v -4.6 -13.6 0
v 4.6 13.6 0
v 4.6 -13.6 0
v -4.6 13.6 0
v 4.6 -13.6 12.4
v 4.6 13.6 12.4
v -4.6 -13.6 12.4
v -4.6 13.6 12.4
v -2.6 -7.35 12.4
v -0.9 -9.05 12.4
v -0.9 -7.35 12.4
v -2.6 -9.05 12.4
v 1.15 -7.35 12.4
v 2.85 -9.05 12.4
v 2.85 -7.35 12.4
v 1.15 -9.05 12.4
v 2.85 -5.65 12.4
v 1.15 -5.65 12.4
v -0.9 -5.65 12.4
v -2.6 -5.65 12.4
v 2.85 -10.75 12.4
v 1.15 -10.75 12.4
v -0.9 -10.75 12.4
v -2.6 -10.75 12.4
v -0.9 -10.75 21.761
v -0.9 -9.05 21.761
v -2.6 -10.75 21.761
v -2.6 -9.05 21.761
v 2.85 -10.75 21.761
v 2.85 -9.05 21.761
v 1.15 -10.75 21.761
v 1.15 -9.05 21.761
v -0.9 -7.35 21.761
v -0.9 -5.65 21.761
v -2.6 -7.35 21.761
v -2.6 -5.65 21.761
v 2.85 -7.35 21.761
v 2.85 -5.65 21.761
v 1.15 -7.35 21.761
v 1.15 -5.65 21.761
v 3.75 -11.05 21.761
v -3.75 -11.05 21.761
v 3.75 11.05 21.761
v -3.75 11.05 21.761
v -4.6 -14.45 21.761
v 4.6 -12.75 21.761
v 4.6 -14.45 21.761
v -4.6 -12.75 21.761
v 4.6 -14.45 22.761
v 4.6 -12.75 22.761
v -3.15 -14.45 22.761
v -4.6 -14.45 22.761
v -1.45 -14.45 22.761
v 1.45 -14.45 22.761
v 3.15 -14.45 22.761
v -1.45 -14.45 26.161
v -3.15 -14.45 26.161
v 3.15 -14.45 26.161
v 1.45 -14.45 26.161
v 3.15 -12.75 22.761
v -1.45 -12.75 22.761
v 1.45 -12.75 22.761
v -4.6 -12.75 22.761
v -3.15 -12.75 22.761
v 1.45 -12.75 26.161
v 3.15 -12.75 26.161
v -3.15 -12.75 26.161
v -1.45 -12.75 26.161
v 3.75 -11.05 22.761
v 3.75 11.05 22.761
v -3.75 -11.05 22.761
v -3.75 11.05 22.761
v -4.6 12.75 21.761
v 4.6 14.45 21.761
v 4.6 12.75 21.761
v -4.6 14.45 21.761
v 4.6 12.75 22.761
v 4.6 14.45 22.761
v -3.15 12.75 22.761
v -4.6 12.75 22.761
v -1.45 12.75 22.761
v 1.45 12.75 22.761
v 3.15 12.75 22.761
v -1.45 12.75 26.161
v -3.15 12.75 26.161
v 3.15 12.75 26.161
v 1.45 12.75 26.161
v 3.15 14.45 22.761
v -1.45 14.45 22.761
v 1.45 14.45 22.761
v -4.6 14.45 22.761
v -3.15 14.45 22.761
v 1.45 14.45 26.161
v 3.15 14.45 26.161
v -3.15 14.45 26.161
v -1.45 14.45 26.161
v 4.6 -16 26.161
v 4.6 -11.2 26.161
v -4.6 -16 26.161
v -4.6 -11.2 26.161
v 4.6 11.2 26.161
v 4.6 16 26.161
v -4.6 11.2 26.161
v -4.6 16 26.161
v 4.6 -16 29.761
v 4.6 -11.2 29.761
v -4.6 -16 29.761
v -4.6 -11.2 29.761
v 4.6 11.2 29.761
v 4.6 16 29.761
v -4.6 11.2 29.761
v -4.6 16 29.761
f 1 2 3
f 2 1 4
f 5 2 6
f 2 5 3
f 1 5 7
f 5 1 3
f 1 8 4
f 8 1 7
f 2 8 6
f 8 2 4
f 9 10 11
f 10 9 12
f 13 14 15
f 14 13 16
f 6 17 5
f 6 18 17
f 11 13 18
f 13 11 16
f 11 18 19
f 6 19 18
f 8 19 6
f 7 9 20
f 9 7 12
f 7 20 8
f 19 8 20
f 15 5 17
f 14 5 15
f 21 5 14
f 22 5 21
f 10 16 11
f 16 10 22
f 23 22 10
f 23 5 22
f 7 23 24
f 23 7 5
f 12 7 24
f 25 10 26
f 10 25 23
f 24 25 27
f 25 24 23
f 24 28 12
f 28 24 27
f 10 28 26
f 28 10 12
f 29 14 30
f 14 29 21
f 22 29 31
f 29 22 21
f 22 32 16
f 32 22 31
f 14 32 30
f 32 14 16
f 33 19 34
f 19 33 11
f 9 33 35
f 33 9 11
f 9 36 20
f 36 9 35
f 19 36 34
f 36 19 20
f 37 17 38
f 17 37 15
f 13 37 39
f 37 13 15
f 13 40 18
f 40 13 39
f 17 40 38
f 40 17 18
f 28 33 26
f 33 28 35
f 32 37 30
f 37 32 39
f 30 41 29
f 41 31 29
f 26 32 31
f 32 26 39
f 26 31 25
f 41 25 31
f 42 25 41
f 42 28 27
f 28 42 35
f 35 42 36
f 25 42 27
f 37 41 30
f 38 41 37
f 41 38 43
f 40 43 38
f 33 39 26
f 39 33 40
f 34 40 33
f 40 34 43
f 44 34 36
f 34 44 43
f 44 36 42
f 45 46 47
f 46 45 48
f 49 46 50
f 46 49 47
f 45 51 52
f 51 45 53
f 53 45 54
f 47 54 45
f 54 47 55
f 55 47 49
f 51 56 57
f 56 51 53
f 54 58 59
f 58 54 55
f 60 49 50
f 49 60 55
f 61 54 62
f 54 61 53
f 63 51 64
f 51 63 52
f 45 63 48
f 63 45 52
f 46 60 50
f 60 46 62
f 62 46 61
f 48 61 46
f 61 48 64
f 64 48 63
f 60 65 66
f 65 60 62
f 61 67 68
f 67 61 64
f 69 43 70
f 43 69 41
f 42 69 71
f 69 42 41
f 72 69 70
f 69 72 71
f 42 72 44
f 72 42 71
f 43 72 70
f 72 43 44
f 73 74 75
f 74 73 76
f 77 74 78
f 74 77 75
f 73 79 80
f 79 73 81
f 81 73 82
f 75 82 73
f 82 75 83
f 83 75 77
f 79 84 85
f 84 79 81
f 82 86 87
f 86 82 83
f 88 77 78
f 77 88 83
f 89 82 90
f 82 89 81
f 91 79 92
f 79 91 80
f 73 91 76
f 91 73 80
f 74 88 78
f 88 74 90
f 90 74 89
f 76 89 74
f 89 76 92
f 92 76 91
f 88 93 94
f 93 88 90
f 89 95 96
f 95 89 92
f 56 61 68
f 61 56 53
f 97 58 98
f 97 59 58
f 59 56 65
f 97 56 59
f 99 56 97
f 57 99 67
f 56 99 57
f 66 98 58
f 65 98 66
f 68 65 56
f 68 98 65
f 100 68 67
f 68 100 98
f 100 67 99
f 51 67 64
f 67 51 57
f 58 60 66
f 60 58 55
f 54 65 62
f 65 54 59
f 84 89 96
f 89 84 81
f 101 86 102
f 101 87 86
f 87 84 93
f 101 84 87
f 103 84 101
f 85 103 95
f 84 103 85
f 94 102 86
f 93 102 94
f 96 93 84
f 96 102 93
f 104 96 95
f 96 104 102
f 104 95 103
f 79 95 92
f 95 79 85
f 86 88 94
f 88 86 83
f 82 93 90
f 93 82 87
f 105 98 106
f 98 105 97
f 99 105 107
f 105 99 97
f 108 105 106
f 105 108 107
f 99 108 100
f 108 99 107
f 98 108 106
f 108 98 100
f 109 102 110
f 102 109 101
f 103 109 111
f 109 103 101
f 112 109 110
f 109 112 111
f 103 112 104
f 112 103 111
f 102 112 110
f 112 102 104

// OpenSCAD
// Generated by SolidPython 0.4.2 on 2020-09-29 23:20:35
//!OpenSCAD

scale(v = 0.0100000000) {
	translate(v = [-460, -1360, 0]) {
		union() {
			color(c = [0.4000000000, 0.4000000000, 0.4000000000]) {
				translate(v = [0, 0, 0]) {
					linear_extrude(height = 1000.0000000000) {
						polygon(paths = [[0, 1, 2, 3]], points = [[0, 0], [0, 2720], [920, 2720], [920, 0]]);
					}
				}
			}
			color(c = [0.2000000000, 0.6000000000, 0.2000000000]) {
				translate(v = [0, 0, 1000.0000000000]) {
					linear_extrude(height = 120.0000000000) {
						polygon(paths = [[0, 1, 2, 3]], points = [[0, 1305], [0, 2720], [920, 2720], [920, 1305]]);
					}
				}
			}
			color(c = [0.4000000000, 0.4000000000, 0.4000000000]) {
				translate(v = [0, 0, 1000.0000000000]) {
					linear_extrude(height = 120.0000000000) {
						polygon(paths = [[0, 1, 2, 3]], points = [[0, 0], [0, 1305], [920, 1305], [920, 0]]);
					}
				}
			}
			color(c = [0.9000000000, 0.6000000000, 0.9000000000]) {
				translate(v = [0, 0, 1120.0000000000]) {
					linear_extrude(height = 120.0000000000) {
						polygon(paths = [[0, 1, 2, 3]], points = [[155, 195], [155, 885], [785, 885], [785, 195]]);
					}
				}
			}
			color(c = [0.2000000000, 0.6000000000, 0.2000000000]) {
				translate(v = [0, 0, 1120.0000000000]) {
					linear_extrude(height = 120.0000000000) {
						polygon(paths = [[0, 1, 2, 3]], points = [[0, 1305], [0, 2720], [920, 2720], [920, 1305]]);
					}
				}
			}
			color(c = [0.4000000000, 0.4000000000, 0.4000000000]) {
				translate(v = [0, 0, 1120.0000000000]) {
					linear_extrude(height = 120.0000000000) {
						difference() {
							polygon(paths = [[0, 1, 2, 3]], points = [[0, 0], [0, 1305], [920, 1305], [920, 0]]);
							polygon(paths = [[0, 1, 2, 3]], points = [[155, 195], [785, 195], [785, 885], [155, 885]]);
						}
					}
				}
			}
			color(c = [0.1000000000, 0.1000000000, 0.1000000000]) {
				translate(v = [0, 0, 1240.0000000000]) {
					linear_extrude(height = 70.0000000000) {
						polygon(paths = [[0, 1, 2, 3]], points = [[200, 285], [200, 455], [370, 455], [370, 285]]);
					}
				}
			}
			color(c = [0.1000000000, 0.1000000000, 0.1000000000]) {
				translate(v = [0, 0, 1240.0000000000]) {
					linear_extrude(height = 70.0000000000) {
						polygon(paths = [[0, 1, 2, 3]], points = [[575, 285], [575, 455], [745, 455], [745, 285]]);
					}
				}
			}
			color(c = [0.1000000000, 0.1000000000, 0.1000000000]) {
				translate(v = [0, 0, 1240.0000000000]) {
					linear_extrude(height = 70.0000000000) {
						polygon(paths = [[0, 1, 2, 3]], points = [[200, 625], [200, 795], [370, 795], [370, 625]]);
					}
				}
			}
			color(c = [0.1000000000, 0.1000000000, 0.1000000000]) {
				translate(v = [0, 0, 1240.0000000000]) {
					linear_extrude(height = 70.0000000000) {
						polygon(paths = [[0, 1, 2, 3]], points = [[575, 625], [575, 795], [745, 795], [745, 625]]);
					}
				}
			}
			color(c = [0.1000000000, 0.1000000000, 0.1000000000]) {
				translate(v = [0, 0, 1310.0000000000]) {
					linear_extrude(height = 180.0000000000) {
						polygon(paths = [[0, 1, 2, 3]], points = [[200, 285], [200, 455], [370, 455], [370, 285]]);
					}
				}
			}
			color(c = [0.1000000000, 0.1000000000, 0.1000000000]) {
				translate(v = [0, 0, 1310.0000000000]) {
					linear_extrude(height = 180.0000000000) {
						polygon(paths = [[0, 1, 2, 3]], points = [[575, 285], [575, 455], [745, 455], [745, 285]]);
					}
				}
			}
			color(c = [0.1000000000, 0.1000000000, 0.1000000000]) {
				translate(v = [0, 0, 1310.0000000000]) {
					linear_extrude(height = 180.0000000000) {
						polygon(paths = [[0, 1, 2, 3]], points = [[200, 625], [200, 795], [370, 795], [370, 625]]);
					}
				}
			}
			color(c = [0.1000000000, 0.1000000000, 0.1000000000]) {
				translate(v = [0, 0, 1310.0000000000]) {
					linear_extrude(height = 180.0000000000) {
						polygon(paths = [[0, 1, 2, 3]], points = [[575, 625], [575, 795], [745, 795], [745, 625]]);
					}
				}
			}
			color(c = [0.1000000000, 0.1000000000, 0.1000000000]) {
				translate(v = [0, 0, 1490.0000000000]) {
					linear_extrude(height = 686.1000000000) {
						polygon(paths = [[0, 1, 2, 3]], points = [[200, 285], [200, 455], [370, 455], [370, 285]]);
					}
				}
			}
			color(c = [0.1000000000, 0.1000000000, 0.1000000000]) {
				translate(v = [0, 0, 1490.0000000000]) {
					linear_extrude(height = 686.1000000000) {
						polygon(paths = [[0, 1, 2, 3]], points = [[575, 285], [575, 455], [745, 455], [745, 285]]);
					}
				}
			}
			color(c = [0.1000000000, 0.1000000000, 0.1000000000]) {
				translate(v = [0, 0, 1490.0000000000]) {
					linear_extrude(height = 686.1000000000) {
						polygon(paths = [[0, 1, 2, 3]], points = [[200, 625], [200, 795], [370, 795], [370, 625]]);
					}
				}
			}
			color(c = [0.1000000000, 0.1000000000, 0.1000000000]) {
				translate(v = [0, 0, 1490.0000000000]) {
					linear_extrude(height = 686.1000000000) {
						polygon(paths = [[0, 1, 2, 3]], points = [[575, 625], [575, 795], [745, 795], [745, 625]]);
					}
				}
			}
			color(c = [0.9000000000, 0.6000000000, 0.6000000000]) {
				translate(v = [0, 0, 2176.1000000000]) {
					linear_extrude(height = 100.0000000000) {
						polygon(paths = [[0, 1, 2, 3]], points = [[0, -85], [0, 85], [920, 85], [920, -85]]);
					}
				}
			}
			color(c = [0.9000000000, 0.6000000000, 0.6000000000]) {
				translate(v = [0, 0, 2176.1000000000]) {
					linear_extrude(height = 100.0000000000) {
						polygon(paths = [[0, 1, 2, 3]], points = [[85, 255], [85, 2465], [835, 2465], [835, 255]]);
					}
				}
			}
			color(c = [0.9000000000, 0.6000000000, 0.6000000000]) {
				translate(v = [0, 0, 2176.1000000000]) {
					linear_extrude(height = 100.0000000000) {
						polygon(paths = [[0, 1, 2, 3]], points = [[0, 2635], [0, 2805], [920, 2805], [920, 2635]]);
					}
				}
			}
			color(c = [0.5000000000, 0.5000000000, 0.5000000000]) {
				translate(v = [0, 0, 2276.1000000000]) {
					linear_extrude(height = 340.0000000000) {
						polygon(paths = [[0, 1, 2, 3]], points = [[145, -85], [145, 85], [315, 85], [315, -85]]);
					}
				}
			}
			color(c = [0.5000000000, 0.5000000000, 0.5000000000]) {
				translate(v = [0, 0, 2276.1000000000]) {
					linear_extrude(height = 340.0000000000) {
						polygon(paths = [[0, 1, 2, 3]], points = [[605, -85], [605, 85], [775, 85], [775, -85]]);
					}
				}
			}
			color(c = [0.5000000000, 0.5000000000, 0.5000000000]) {
				translate(v = [0, 0, 2276.1000000000]) {
					linear_extrude(height = 340.0000000000) {
						polygon(paths = [[0, 1, 2, 3]], points = [[145, 2635], [145, 2805], [315, 2805], [315, 2635]]);
					}
				}
			}
			color(c = [0.5000000000, 0.5000000000, 0.5000000000]) {
				translate(v = [0, 0, 2276.1000000000]) {
					linear_extrude(height = 340.0000000000) {
						polygon(paths = [[0, 1, 2, 3]], points = [[605, 2635], [605, 2805], [775, 2805], [775, 2635]]);
					}
				}
			}
			color(c = [0.3000000000, 0.3000000000, 1]) {
				translate(v = [0, 0, 2616.1000000000]) {
					linear_extrude(height = 360.0000000000) {
						polygon(paths = [[0, 1, 2, 3]], points = [[0, -240], [0, 240], [920, 240], [920, -240]]);
					}
				}
			}
			color(c = [0.3000000000, 0.3000000000, 1]) {
				translate(v = [0, 0, 2616.1000000000]) {
					linear_extrude(height = 360.0000000000) {
						polygon(paths = [[0, 1, 2, 3]], points = [[0, 2480], [0, 2960], [920, 2960], [920, 2480]]);
					}
				}
			}
		}
	}
}
